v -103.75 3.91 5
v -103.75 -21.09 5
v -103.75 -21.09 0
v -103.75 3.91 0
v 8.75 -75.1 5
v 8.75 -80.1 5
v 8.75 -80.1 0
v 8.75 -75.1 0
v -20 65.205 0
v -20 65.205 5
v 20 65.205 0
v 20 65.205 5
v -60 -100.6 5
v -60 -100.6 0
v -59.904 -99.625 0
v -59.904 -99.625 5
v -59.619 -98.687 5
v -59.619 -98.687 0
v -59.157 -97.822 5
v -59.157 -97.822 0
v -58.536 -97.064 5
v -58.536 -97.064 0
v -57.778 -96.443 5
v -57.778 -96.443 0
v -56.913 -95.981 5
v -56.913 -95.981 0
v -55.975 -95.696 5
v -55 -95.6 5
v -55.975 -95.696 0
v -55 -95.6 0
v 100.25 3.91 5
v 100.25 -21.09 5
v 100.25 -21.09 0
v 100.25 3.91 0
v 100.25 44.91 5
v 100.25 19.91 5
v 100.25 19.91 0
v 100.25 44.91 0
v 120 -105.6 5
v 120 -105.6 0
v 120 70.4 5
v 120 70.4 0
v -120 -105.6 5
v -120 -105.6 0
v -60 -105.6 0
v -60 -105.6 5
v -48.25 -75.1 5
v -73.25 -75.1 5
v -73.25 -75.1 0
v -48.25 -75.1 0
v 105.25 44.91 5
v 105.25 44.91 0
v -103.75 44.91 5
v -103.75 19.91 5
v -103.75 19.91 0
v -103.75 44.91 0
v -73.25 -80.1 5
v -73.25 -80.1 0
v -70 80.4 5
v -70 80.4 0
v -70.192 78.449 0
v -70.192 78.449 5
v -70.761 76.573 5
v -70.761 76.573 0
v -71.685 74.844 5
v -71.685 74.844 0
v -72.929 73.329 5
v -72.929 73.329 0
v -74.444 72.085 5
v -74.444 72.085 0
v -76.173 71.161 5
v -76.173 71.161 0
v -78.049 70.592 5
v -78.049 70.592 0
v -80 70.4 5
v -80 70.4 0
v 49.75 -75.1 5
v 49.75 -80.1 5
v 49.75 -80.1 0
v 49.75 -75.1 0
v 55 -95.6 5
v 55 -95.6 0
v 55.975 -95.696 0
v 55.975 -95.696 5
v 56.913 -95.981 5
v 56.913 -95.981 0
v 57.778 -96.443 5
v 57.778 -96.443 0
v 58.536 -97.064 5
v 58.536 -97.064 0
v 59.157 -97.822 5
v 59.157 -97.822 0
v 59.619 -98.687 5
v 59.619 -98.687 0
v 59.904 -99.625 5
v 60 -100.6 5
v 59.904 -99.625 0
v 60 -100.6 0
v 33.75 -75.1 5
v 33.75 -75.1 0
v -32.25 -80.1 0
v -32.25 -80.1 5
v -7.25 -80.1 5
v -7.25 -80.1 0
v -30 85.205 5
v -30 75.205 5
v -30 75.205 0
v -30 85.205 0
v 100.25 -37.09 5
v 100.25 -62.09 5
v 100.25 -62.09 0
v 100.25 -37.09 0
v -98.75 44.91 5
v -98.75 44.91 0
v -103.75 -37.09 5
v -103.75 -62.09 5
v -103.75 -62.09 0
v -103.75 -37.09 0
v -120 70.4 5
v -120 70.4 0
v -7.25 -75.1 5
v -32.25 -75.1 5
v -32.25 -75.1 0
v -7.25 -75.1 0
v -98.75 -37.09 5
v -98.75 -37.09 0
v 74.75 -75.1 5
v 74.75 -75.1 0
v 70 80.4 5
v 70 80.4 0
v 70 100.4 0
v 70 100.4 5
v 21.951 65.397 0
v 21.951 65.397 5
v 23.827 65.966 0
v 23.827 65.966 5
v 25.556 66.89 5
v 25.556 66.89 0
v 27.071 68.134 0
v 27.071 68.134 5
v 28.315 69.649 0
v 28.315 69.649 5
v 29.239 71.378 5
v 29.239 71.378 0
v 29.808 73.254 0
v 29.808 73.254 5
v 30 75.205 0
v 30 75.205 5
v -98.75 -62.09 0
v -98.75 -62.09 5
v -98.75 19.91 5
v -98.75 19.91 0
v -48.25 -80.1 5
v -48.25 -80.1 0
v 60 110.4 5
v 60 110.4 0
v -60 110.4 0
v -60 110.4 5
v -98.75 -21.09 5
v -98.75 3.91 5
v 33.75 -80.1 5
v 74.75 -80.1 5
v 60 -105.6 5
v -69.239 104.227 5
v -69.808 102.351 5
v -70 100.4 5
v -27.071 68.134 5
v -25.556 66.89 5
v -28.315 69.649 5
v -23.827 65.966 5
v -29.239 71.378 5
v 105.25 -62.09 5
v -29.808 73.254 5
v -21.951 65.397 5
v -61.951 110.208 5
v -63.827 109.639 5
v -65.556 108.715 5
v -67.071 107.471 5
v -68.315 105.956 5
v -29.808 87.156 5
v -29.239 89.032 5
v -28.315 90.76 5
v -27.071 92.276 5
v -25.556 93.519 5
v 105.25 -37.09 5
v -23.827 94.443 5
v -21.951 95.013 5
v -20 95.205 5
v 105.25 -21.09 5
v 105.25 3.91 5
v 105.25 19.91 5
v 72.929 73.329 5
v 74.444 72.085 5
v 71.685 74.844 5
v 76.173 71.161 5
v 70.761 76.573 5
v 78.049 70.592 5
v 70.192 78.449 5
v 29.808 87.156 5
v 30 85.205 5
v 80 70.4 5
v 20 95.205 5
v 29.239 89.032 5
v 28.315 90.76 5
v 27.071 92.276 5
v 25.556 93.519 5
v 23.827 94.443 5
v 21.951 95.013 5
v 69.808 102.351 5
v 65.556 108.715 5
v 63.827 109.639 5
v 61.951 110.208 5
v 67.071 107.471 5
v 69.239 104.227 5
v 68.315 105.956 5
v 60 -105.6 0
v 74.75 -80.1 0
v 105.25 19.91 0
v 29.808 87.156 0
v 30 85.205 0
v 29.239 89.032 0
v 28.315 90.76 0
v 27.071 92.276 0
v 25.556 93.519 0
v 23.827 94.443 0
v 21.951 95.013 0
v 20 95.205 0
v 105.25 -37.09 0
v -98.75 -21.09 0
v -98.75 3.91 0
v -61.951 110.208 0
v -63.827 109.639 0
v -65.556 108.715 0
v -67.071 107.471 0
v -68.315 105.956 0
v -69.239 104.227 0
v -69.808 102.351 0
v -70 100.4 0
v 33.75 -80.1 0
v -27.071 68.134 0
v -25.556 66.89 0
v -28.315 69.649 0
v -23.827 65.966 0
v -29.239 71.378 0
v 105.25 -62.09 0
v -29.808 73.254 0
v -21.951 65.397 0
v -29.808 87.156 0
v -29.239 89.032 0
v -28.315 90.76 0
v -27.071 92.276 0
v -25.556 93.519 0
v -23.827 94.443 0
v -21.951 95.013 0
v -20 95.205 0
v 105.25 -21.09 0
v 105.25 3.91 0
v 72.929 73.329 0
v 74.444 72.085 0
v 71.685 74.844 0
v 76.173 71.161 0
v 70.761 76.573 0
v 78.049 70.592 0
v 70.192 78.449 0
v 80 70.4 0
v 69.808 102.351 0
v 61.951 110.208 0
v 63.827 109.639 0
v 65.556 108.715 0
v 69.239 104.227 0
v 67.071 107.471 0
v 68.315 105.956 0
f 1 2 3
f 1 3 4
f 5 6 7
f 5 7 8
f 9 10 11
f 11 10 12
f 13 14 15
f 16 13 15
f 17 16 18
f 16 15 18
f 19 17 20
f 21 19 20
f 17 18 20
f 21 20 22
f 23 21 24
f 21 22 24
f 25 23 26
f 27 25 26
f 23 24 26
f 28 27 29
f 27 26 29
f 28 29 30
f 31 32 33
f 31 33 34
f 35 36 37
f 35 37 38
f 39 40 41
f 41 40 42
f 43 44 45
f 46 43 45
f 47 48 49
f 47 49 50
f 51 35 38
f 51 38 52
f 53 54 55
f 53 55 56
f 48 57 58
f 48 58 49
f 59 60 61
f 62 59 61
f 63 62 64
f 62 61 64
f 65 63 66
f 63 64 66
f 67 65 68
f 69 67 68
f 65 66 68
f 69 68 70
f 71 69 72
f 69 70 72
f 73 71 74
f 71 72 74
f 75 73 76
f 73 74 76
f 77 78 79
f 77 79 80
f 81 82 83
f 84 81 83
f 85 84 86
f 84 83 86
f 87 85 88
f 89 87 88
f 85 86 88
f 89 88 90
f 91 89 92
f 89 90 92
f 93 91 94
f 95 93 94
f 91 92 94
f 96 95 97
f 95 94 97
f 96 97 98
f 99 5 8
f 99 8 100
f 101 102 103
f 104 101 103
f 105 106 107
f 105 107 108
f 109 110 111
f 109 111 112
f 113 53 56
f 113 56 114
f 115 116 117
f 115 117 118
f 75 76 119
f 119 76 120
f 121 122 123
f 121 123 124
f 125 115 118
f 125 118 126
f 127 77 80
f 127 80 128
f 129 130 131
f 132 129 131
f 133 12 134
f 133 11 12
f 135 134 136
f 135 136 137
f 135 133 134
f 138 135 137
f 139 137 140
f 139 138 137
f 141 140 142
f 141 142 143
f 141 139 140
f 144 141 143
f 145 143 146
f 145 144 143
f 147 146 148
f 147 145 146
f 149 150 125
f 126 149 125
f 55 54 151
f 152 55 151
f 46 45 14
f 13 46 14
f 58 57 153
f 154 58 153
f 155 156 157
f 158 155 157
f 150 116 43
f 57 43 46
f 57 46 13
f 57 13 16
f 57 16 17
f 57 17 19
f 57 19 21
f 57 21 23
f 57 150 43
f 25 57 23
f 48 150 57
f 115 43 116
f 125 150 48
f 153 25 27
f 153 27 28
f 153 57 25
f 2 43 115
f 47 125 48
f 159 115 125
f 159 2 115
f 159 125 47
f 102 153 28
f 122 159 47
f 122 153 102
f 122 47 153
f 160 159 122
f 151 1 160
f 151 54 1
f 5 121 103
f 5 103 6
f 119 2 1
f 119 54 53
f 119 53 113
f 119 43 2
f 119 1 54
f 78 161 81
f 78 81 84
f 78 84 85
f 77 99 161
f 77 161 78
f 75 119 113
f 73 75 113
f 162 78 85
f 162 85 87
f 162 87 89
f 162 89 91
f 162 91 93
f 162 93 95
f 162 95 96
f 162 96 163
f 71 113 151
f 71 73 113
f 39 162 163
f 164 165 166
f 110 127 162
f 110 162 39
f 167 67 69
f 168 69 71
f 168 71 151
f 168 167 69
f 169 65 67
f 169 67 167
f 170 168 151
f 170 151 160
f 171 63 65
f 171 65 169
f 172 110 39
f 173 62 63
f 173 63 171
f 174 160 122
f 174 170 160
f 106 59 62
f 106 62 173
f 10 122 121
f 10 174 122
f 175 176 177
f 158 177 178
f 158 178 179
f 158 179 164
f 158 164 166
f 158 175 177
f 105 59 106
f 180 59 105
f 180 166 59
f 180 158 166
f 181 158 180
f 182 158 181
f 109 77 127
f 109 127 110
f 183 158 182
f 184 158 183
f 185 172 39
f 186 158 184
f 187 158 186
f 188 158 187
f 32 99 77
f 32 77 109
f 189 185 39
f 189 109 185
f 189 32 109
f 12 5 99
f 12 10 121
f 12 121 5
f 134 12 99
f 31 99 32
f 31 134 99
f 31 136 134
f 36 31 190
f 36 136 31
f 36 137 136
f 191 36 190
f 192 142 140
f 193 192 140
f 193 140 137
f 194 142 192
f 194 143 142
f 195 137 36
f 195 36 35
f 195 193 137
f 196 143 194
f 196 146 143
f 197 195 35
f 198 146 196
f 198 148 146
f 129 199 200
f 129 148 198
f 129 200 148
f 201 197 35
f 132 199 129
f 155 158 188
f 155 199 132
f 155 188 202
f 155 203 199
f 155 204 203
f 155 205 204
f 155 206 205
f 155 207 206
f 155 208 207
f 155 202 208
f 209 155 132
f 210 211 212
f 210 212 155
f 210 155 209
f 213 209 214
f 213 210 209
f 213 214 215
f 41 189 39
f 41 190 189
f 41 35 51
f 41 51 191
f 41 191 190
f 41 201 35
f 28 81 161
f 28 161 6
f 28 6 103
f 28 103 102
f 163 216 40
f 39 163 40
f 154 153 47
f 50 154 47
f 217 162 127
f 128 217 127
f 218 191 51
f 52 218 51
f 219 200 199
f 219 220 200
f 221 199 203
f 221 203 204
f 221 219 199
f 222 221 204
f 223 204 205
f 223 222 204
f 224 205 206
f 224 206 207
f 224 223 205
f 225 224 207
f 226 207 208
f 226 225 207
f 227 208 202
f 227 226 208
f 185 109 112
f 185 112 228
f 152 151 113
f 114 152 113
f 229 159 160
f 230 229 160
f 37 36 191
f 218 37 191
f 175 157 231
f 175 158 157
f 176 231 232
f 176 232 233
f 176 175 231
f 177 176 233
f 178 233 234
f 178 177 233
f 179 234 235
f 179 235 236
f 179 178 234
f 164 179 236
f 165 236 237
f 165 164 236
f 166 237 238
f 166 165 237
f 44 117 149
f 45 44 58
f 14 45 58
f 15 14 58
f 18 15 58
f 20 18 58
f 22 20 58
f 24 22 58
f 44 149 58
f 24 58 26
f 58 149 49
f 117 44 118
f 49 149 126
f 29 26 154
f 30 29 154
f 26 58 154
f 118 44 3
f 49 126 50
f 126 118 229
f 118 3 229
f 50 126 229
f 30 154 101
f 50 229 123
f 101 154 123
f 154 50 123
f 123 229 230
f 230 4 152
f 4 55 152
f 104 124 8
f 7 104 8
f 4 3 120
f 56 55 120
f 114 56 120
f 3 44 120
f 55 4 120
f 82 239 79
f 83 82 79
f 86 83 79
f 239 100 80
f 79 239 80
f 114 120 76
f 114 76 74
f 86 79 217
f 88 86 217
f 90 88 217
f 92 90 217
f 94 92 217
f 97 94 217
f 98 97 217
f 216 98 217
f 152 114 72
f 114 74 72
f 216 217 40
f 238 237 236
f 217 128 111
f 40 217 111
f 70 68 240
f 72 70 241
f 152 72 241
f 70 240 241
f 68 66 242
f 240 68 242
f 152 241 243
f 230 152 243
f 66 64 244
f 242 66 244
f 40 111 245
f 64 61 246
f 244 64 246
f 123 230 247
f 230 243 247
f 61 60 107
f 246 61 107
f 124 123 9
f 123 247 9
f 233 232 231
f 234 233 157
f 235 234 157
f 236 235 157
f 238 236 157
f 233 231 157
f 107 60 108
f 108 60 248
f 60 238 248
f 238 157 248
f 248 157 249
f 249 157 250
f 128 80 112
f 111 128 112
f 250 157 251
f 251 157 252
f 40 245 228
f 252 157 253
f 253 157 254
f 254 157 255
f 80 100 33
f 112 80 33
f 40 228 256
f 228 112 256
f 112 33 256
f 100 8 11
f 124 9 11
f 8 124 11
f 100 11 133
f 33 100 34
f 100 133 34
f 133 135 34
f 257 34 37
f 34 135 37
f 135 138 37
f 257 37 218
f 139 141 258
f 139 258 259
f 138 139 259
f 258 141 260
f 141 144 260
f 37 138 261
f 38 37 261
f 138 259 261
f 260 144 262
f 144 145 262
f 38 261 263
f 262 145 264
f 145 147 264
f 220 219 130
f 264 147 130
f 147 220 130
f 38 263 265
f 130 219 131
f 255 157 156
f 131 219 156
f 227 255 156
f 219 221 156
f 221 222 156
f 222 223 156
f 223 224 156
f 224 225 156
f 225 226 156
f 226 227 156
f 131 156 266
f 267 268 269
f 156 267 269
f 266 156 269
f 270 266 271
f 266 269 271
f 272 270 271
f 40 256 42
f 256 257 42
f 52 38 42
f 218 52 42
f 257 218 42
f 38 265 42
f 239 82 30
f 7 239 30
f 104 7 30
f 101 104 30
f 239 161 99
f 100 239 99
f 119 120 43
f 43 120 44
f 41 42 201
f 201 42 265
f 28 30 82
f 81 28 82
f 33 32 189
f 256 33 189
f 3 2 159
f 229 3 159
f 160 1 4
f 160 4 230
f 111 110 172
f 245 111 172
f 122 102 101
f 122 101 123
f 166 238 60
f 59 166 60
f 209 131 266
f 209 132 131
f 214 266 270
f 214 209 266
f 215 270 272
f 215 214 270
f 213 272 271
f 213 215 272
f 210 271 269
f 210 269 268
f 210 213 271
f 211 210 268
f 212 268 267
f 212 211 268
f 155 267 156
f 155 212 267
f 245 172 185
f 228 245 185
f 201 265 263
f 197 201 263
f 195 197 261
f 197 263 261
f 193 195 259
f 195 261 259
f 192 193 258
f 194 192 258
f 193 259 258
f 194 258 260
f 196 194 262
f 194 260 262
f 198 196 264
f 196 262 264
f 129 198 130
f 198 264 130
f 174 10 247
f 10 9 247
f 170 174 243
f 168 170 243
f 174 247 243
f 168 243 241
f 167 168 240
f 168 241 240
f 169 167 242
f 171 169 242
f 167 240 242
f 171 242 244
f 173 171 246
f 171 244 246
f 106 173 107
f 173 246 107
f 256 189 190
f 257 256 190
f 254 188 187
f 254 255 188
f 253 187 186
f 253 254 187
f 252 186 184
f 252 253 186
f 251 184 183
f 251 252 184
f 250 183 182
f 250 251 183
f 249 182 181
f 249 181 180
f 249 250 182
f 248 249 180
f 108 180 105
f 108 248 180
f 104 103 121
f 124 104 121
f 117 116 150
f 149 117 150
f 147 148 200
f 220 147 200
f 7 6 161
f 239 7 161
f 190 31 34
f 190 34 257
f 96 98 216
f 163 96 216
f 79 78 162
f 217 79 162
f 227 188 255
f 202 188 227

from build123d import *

# Parameters (mm, degrees)
BOSS_EXTRUDE1_DEPTH = 5
SKETCH2_W           = 5
SKETCH2_H           = 25
CUT_EXTRUDE1_DEPTH  = 164.135403883
FILLET1_R           = 10
SKETCH3_W           = 25
SKETCH3_H           = 5
CUT_EXTRUDE2_DEPTH  = 10
SKETCH4_W           = 60
SKETCH4_H           = 30
CUT_EXTRUDE3_DEPTH  = 35
FILLET2_R           = 10


with BuildPart() as part:
    # Sketch1 → Boss-Extrude1 (new body)
    with BuildSketch(Plane.XY):
        with BuildLine():
            Line((60, -105.6), (120, -105.6))
            Line((120, -105.6), (120, 70.4))
            Line((120, 70.4), (80, 70.4))
            ThreePointArc((80, 70.4), (72.928932188, 73.328932188), (70, 80.4))
            Line((70, 80.4), (70, 110.4))
            Line((70, 110.4), (-70, 110.4))
            Line((-70, 110.4), (-70, 80.4))
            ThreePointArc((-70, 80.4), (-72.928932188, 73.328932188), (-80, 70.4))
            Line((-80, 70.4), (-120, 70.4))
            Line((-120, 70.4), (-120, -105.6))
            Line((-120, -105.6), (-60, -105.6))
            Line((-60, -105.6), (-60, -100.6))
            ThreePointArc((-60, -100.6), (-58.535533906, -97.064466094), (-55, -95.6))
            Line((-55, -95.6), (55, -95.6))
            ThreePointArc((55, -95.6), (58.535533906, -97.064466094), (60, -100.6))
            Line((60, -100.6), (60, -105.6))
        make_face()
    extrude(amount=BOSS_EXTRUDE1_DEPTH)

    # Sketch2 → Cut-Extrude1 (cut, through all)
    with BuildSketch(Plane.XY.offset(5)):
        with Locations((102.75, 32.41)):
            Rectangle(SKETCH2_W, SKETCH2_H)
        with Locations((102.75, -8.59)):
            Rectangle(SKETCH2_W, SKETCH2_H)
        with Locations((102.75, -49.59)):
            Rectangle(SKETCH2_W, SKETCH2_H)
        with Locations((-101.25, 32.41)):
            Rectangle(SKETCH2_W, SKETCH2_H)
        with Locations((-101.25, -8.59)):
            Rectangle(SKETCH2_W, SKETCH2_H)
        with Locations((-101.25, -49.59)):
            Rectangle(SKETCH2_W, SKETCH2_H)
    extrude(amount=-CUT_EXTRUDE1_DEPTH, mode=Mode.SUBTRACT)

    # Fillet1
    fillet1_edges = [part.edges().sort_by_distance(p)[0] for p in [
        (-70, 110.4, 2.5),
        (70, 110.4, 2.5),
    ]]
    fillet(fillet1_edges, radius=FILLET1_R)

    # Sketch3 → Cut-Extrude2 (cut)
    with BuildSketch(Plane.XY.offset(5)):
        with Locations((62.25, -77.6)):
            Rectangle(SKETCH3_W, SKETCH3_H)
        with Locations((21.25, -77.6)):
            Rectangle(SKETCH3_W, SKETCH3_H)
        with Locations((-19.75, -77.6)):
            Rectangle(SKETCH3_W, SKETCH3_H)
        with Locations((-60.75, -77.6)):
            Rectangle(SKETCH3_W, SKETCH3_H)
    extrude(amount=-CUT_EXTRUDE2_DEPTH, mode=Mode.SUBTRACT)

    # Sketch4 → Cut-Extrude3 (cut)
    with BuildSketch(Plane.XY.offset(5)):
        with Locations((0, 80.204694575)):
            Rectangle(SKETCH4_W, SKETCH4_H)
    extrude(amount=-CUT_EXTRUDE3_DEPTH, mode=Mode.SUBTRACT)

    # Fillet2
    fillet2_edges = [part.edges().sort_by_distance(p)[0] for p in [
        (-30, 65.204694575, 2.5),
        (-30, 95.204694575, 2.5),
        (30, 95.204694575, 2.5),
        (30, 65.204694575, 2.5),
    ]]
    fillet(fillet2_edges, radius=FILLET2_R)


solid = part.part
